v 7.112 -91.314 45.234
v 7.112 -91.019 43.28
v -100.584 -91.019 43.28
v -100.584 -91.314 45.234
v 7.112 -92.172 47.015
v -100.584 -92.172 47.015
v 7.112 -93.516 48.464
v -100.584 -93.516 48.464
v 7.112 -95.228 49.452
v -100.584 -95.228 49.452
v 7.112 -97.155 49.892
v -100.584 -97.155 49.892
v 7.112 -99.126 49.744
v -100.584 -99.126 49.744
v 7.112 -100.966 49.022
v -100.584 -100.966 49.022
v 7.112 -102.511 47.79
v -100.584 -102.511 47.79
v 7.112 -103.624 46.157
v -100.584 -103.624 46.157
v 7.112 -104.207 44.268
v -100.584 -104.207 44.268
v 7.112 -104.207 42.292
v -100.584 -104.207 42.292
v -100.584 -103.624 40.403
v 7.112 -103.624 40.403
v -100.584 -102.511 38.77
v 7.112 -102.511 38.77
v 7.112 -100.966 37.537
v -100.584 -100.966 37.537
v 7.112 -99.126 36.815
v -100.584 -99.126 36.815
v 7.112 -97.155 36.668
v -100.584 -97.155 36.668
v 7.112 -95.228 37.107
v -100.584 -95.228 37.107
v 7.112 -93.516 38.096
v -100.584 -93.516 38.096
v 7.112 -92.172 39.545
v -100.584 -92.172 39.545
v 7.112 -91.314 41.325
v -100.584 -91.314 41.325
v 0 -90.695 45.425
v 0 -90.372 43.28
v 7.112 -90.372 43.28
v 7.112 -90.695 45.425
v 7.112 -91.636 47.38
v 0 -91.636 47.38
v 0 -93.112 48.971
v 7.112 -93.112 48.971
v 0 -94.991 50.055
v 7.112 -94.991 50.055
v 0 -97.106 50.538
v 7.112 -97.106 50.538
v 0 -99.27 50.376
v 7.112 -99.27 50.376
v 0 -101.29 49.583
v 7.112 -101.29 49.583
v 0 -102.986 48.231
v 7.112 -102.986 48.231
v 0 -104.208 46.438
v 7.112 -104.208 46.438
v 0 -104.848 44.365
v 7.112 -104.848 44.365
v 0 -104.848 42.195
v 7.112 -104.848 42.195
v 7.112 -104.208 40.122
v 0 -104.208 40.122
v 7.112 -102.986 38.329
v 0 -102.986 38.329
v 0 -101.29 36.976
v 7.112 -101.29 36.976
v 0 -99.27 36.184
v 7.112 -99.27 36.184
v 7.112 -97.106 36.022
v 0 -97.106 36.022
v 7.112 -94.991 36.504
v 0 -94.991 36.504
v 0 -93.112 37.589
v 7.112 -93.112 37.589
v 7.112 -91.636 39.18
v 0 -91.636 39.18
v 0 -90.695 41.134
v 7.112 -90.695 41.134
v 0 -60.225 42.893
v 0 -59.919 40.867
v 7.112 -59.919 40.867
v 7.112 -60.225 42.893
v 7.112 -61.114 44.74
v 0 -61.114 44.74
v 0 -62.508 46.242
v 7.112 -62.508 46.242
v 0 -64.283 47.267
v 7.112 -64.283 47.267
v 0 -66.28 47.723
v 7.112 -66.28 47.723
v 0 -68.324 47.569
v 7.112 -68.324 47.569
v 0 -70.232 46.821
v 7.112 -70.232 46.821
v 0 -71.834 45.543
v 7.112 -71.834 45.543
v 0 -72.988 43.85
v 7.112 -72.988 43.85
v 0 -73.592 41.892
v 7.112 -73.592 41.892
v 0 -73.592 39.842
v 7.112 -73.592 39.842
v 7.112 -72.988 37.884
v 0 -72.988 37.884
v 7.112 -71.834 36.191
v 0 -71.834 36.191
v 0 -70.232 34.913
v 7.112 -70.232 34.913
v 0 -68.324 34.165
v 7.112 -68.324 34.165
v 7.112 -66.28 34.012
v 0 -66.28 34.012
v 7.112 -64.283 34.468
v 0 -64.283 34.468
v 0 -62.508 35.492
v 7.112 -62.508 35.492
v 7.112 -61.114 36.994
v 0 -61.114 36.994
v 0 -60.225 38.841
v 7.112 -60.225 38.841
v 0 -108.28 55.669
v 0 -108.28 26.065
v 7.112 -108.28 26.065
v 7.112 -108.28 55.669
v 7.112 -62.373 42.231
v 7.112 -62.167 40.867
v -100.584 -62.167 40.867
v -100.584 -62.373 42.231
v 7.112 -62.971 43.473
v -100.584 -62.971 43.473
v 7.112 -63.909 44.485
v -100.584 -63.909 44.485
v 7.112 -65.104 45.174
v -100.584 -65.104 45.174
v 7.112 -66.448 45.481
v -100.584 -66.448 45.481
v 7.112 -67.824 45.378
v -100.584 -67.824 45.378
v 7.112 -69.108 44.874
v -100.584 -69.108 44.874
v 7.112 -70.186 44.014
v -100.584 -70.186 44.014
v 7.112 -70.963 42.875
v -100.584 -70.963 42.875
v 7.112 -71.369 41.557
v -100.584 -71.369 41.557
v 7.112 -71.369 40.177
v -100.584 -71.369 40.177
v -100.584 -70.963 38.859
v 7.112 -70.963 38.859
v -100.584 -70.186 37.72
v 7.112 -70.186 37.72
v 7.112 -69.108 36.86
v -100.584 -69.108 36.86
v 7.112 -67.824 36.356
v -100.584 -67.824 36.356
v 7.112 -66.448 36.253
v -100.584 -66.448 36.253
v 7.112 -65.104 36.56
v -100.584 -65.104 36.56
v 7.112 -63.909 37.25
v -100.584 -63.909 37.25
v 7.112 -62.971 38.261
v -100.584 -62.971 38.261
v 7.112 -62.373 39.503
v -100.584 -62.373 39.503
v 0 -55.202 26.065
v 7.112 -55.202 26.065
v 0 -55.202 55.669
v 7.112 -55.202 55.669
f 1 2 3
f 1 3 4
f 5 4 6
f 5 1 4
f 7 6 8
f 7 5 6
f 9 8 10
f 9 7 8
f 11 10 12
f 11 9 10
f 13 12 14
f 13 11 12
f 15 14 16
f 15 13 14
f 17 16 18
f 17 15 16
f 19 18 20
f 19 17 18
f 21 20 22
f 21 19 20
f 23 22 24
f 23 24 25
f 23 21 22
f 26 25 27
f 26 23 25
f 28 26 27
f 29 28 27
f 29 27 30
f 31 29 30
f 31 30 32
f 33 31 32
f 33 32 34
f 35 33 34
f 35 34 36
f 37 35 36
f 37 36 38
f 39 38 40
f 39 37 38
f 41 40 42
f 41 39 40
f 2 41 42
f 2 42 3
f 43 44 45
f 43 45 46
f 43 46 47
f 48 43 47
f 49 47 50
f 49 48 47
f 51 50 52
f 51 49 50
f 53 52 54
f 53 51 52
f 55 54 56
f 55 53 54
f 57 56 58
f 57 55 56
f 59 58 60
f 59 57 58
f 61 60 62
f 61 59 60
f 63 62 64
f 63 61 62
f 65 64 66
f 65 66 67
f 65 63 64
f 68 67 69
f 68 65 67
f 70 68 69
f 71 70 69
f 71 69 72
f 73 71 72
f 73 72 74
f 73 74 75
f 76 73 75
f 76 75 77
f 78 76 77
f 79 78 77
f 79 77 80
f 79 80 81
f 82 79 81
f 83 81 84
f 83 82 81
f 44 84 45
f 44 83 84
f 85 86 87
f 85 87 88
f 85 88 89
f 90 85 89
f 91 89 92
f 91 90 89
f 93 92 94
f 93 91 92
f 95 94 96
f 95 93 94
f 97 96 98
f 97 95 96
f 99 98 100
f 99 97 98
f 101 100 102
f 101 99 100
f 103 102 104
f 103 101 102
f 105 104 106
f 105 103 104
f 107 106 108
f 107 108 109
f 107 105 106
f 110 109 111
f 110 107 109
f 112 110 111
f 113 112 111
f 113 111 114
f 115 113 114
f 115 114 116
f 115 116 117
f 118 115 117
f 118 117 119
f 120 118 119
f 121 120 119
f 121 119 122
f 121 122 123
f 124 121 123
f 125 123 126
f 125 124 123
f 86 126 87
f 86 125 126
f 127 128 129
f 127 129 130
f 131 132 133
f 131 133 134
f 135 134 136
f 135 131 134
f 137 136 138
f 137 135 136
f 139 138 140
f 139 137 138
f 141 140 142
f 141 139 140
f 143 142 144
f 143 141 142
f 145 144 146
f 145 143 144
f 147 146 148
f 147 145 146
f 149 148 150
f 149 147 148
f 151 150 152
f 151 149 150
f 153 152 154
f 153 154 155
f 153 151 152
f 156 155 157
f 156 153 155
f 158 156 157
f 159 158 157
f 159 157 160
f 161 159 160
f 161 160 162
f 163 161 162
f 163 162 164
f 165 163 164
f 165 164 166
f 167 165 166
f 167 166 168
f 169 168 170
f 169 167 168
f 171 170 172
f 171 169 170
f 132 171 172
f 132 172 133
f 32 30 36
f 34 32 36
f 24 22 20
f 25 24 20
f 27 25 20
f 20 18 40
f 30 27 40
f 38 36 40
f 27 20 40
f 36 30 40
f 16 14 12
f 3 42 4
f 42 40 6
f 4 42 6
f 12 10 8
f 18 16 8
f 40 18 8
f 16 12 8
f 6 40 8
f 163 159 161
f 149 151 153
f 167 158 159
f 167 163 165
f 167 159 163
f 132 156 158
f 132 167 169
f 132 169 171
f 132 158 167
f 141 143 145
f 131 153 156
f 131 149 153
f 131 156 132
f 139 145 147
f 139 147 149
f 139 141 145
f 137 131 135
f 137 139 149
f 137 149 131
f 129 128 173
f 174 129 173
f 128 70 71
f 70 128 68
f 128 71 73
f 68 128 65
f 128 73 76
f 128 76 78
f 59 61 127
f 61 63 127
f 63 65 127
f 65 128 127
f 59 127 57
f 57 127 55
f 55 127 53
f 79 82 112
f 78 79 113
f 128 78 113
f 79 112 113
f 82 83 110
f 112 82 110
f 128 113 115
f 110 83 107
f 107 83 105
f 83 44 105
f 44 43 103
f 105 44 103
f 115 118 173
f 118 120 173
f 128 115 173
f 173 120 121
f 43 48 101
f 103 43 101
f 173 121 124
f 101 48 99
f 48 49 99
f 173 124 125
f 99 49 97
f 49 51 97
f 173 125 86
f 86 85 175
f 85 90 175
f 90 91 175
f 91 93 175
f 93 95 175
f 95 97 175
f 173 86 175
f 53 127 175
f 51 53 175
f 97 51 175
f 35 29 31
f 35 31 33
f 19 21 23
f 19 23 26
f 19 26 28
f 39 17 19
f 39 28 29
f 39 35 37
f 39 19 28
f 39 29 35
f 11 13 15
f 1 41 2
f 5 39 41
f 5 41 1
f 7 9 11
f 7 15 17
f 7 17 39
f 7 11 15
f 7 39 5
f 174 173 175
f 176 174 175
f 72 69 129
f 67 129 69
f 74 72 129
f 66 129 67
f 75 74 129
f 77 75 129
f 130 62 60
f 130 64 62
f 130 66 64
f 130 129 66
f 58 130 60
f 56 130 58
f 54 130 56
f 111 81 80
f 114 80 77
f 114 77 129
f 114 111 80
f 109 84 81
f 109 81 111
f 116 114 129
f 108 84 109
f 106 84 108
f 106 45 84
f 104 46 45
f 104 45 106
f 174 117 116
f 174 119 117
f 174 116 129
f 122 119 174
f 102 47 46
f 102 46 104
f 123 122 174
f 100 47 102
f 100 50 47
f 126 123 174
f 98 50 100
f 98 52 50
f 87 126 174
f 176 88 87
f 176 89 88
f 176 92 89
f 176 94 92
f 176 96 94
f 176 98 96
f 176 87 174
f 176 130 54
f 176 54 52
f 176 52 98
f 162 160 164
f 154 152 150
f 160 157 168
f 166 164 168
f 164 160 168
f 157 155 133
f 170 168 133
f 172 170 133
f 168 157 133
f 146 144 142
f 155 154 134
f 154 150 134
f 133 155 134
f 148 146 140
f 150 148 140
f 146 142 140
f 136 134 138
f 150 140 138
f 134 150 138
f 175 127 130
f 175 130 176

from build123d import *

# Parameters (mm, degrees)
F0_W     = 53.078588
F0_H     = 29.603792
F0_R     = 7.2786
F0_R_2   = 6.874734
F1_DEPTH = 7.112
F2_R     = 6.630812
F2_R_2   = 4.626915
F3_DEPTH = 107.696


with BuildPart() as f1:
    # F0 (on Right) → F1 (new body)
    with BuildSketch(Plane.YZ):
        with Locations((-81.741052, 40.867043)):
            Rectangle(F0_W, F0_H)
        with Locations((-97.650297, 43.279875)):
            Circle(F0_R, mode=Mode.SUBTRACT)
        with Locations((-66.794194, 40.867043)):
            Circle(F0_R_2, mode=Mode.SUBTRACT)
    extrude(amount=F1_DEPTH)


with BuildPart() as f3:
    # F2 (on face) → F3 (new body)
    with BuildSketch(Plane.YZ.offset(7.112)):
        with Locations((-97.650297, 43.279875)):
            Circle(F2_R)
        with Locations((-66.794194, 40.867043)):
            Circle(F2_R_2)
    extrude(amount=-F3_DEPTH)


solid = Compound([f1.part, f3.part])
